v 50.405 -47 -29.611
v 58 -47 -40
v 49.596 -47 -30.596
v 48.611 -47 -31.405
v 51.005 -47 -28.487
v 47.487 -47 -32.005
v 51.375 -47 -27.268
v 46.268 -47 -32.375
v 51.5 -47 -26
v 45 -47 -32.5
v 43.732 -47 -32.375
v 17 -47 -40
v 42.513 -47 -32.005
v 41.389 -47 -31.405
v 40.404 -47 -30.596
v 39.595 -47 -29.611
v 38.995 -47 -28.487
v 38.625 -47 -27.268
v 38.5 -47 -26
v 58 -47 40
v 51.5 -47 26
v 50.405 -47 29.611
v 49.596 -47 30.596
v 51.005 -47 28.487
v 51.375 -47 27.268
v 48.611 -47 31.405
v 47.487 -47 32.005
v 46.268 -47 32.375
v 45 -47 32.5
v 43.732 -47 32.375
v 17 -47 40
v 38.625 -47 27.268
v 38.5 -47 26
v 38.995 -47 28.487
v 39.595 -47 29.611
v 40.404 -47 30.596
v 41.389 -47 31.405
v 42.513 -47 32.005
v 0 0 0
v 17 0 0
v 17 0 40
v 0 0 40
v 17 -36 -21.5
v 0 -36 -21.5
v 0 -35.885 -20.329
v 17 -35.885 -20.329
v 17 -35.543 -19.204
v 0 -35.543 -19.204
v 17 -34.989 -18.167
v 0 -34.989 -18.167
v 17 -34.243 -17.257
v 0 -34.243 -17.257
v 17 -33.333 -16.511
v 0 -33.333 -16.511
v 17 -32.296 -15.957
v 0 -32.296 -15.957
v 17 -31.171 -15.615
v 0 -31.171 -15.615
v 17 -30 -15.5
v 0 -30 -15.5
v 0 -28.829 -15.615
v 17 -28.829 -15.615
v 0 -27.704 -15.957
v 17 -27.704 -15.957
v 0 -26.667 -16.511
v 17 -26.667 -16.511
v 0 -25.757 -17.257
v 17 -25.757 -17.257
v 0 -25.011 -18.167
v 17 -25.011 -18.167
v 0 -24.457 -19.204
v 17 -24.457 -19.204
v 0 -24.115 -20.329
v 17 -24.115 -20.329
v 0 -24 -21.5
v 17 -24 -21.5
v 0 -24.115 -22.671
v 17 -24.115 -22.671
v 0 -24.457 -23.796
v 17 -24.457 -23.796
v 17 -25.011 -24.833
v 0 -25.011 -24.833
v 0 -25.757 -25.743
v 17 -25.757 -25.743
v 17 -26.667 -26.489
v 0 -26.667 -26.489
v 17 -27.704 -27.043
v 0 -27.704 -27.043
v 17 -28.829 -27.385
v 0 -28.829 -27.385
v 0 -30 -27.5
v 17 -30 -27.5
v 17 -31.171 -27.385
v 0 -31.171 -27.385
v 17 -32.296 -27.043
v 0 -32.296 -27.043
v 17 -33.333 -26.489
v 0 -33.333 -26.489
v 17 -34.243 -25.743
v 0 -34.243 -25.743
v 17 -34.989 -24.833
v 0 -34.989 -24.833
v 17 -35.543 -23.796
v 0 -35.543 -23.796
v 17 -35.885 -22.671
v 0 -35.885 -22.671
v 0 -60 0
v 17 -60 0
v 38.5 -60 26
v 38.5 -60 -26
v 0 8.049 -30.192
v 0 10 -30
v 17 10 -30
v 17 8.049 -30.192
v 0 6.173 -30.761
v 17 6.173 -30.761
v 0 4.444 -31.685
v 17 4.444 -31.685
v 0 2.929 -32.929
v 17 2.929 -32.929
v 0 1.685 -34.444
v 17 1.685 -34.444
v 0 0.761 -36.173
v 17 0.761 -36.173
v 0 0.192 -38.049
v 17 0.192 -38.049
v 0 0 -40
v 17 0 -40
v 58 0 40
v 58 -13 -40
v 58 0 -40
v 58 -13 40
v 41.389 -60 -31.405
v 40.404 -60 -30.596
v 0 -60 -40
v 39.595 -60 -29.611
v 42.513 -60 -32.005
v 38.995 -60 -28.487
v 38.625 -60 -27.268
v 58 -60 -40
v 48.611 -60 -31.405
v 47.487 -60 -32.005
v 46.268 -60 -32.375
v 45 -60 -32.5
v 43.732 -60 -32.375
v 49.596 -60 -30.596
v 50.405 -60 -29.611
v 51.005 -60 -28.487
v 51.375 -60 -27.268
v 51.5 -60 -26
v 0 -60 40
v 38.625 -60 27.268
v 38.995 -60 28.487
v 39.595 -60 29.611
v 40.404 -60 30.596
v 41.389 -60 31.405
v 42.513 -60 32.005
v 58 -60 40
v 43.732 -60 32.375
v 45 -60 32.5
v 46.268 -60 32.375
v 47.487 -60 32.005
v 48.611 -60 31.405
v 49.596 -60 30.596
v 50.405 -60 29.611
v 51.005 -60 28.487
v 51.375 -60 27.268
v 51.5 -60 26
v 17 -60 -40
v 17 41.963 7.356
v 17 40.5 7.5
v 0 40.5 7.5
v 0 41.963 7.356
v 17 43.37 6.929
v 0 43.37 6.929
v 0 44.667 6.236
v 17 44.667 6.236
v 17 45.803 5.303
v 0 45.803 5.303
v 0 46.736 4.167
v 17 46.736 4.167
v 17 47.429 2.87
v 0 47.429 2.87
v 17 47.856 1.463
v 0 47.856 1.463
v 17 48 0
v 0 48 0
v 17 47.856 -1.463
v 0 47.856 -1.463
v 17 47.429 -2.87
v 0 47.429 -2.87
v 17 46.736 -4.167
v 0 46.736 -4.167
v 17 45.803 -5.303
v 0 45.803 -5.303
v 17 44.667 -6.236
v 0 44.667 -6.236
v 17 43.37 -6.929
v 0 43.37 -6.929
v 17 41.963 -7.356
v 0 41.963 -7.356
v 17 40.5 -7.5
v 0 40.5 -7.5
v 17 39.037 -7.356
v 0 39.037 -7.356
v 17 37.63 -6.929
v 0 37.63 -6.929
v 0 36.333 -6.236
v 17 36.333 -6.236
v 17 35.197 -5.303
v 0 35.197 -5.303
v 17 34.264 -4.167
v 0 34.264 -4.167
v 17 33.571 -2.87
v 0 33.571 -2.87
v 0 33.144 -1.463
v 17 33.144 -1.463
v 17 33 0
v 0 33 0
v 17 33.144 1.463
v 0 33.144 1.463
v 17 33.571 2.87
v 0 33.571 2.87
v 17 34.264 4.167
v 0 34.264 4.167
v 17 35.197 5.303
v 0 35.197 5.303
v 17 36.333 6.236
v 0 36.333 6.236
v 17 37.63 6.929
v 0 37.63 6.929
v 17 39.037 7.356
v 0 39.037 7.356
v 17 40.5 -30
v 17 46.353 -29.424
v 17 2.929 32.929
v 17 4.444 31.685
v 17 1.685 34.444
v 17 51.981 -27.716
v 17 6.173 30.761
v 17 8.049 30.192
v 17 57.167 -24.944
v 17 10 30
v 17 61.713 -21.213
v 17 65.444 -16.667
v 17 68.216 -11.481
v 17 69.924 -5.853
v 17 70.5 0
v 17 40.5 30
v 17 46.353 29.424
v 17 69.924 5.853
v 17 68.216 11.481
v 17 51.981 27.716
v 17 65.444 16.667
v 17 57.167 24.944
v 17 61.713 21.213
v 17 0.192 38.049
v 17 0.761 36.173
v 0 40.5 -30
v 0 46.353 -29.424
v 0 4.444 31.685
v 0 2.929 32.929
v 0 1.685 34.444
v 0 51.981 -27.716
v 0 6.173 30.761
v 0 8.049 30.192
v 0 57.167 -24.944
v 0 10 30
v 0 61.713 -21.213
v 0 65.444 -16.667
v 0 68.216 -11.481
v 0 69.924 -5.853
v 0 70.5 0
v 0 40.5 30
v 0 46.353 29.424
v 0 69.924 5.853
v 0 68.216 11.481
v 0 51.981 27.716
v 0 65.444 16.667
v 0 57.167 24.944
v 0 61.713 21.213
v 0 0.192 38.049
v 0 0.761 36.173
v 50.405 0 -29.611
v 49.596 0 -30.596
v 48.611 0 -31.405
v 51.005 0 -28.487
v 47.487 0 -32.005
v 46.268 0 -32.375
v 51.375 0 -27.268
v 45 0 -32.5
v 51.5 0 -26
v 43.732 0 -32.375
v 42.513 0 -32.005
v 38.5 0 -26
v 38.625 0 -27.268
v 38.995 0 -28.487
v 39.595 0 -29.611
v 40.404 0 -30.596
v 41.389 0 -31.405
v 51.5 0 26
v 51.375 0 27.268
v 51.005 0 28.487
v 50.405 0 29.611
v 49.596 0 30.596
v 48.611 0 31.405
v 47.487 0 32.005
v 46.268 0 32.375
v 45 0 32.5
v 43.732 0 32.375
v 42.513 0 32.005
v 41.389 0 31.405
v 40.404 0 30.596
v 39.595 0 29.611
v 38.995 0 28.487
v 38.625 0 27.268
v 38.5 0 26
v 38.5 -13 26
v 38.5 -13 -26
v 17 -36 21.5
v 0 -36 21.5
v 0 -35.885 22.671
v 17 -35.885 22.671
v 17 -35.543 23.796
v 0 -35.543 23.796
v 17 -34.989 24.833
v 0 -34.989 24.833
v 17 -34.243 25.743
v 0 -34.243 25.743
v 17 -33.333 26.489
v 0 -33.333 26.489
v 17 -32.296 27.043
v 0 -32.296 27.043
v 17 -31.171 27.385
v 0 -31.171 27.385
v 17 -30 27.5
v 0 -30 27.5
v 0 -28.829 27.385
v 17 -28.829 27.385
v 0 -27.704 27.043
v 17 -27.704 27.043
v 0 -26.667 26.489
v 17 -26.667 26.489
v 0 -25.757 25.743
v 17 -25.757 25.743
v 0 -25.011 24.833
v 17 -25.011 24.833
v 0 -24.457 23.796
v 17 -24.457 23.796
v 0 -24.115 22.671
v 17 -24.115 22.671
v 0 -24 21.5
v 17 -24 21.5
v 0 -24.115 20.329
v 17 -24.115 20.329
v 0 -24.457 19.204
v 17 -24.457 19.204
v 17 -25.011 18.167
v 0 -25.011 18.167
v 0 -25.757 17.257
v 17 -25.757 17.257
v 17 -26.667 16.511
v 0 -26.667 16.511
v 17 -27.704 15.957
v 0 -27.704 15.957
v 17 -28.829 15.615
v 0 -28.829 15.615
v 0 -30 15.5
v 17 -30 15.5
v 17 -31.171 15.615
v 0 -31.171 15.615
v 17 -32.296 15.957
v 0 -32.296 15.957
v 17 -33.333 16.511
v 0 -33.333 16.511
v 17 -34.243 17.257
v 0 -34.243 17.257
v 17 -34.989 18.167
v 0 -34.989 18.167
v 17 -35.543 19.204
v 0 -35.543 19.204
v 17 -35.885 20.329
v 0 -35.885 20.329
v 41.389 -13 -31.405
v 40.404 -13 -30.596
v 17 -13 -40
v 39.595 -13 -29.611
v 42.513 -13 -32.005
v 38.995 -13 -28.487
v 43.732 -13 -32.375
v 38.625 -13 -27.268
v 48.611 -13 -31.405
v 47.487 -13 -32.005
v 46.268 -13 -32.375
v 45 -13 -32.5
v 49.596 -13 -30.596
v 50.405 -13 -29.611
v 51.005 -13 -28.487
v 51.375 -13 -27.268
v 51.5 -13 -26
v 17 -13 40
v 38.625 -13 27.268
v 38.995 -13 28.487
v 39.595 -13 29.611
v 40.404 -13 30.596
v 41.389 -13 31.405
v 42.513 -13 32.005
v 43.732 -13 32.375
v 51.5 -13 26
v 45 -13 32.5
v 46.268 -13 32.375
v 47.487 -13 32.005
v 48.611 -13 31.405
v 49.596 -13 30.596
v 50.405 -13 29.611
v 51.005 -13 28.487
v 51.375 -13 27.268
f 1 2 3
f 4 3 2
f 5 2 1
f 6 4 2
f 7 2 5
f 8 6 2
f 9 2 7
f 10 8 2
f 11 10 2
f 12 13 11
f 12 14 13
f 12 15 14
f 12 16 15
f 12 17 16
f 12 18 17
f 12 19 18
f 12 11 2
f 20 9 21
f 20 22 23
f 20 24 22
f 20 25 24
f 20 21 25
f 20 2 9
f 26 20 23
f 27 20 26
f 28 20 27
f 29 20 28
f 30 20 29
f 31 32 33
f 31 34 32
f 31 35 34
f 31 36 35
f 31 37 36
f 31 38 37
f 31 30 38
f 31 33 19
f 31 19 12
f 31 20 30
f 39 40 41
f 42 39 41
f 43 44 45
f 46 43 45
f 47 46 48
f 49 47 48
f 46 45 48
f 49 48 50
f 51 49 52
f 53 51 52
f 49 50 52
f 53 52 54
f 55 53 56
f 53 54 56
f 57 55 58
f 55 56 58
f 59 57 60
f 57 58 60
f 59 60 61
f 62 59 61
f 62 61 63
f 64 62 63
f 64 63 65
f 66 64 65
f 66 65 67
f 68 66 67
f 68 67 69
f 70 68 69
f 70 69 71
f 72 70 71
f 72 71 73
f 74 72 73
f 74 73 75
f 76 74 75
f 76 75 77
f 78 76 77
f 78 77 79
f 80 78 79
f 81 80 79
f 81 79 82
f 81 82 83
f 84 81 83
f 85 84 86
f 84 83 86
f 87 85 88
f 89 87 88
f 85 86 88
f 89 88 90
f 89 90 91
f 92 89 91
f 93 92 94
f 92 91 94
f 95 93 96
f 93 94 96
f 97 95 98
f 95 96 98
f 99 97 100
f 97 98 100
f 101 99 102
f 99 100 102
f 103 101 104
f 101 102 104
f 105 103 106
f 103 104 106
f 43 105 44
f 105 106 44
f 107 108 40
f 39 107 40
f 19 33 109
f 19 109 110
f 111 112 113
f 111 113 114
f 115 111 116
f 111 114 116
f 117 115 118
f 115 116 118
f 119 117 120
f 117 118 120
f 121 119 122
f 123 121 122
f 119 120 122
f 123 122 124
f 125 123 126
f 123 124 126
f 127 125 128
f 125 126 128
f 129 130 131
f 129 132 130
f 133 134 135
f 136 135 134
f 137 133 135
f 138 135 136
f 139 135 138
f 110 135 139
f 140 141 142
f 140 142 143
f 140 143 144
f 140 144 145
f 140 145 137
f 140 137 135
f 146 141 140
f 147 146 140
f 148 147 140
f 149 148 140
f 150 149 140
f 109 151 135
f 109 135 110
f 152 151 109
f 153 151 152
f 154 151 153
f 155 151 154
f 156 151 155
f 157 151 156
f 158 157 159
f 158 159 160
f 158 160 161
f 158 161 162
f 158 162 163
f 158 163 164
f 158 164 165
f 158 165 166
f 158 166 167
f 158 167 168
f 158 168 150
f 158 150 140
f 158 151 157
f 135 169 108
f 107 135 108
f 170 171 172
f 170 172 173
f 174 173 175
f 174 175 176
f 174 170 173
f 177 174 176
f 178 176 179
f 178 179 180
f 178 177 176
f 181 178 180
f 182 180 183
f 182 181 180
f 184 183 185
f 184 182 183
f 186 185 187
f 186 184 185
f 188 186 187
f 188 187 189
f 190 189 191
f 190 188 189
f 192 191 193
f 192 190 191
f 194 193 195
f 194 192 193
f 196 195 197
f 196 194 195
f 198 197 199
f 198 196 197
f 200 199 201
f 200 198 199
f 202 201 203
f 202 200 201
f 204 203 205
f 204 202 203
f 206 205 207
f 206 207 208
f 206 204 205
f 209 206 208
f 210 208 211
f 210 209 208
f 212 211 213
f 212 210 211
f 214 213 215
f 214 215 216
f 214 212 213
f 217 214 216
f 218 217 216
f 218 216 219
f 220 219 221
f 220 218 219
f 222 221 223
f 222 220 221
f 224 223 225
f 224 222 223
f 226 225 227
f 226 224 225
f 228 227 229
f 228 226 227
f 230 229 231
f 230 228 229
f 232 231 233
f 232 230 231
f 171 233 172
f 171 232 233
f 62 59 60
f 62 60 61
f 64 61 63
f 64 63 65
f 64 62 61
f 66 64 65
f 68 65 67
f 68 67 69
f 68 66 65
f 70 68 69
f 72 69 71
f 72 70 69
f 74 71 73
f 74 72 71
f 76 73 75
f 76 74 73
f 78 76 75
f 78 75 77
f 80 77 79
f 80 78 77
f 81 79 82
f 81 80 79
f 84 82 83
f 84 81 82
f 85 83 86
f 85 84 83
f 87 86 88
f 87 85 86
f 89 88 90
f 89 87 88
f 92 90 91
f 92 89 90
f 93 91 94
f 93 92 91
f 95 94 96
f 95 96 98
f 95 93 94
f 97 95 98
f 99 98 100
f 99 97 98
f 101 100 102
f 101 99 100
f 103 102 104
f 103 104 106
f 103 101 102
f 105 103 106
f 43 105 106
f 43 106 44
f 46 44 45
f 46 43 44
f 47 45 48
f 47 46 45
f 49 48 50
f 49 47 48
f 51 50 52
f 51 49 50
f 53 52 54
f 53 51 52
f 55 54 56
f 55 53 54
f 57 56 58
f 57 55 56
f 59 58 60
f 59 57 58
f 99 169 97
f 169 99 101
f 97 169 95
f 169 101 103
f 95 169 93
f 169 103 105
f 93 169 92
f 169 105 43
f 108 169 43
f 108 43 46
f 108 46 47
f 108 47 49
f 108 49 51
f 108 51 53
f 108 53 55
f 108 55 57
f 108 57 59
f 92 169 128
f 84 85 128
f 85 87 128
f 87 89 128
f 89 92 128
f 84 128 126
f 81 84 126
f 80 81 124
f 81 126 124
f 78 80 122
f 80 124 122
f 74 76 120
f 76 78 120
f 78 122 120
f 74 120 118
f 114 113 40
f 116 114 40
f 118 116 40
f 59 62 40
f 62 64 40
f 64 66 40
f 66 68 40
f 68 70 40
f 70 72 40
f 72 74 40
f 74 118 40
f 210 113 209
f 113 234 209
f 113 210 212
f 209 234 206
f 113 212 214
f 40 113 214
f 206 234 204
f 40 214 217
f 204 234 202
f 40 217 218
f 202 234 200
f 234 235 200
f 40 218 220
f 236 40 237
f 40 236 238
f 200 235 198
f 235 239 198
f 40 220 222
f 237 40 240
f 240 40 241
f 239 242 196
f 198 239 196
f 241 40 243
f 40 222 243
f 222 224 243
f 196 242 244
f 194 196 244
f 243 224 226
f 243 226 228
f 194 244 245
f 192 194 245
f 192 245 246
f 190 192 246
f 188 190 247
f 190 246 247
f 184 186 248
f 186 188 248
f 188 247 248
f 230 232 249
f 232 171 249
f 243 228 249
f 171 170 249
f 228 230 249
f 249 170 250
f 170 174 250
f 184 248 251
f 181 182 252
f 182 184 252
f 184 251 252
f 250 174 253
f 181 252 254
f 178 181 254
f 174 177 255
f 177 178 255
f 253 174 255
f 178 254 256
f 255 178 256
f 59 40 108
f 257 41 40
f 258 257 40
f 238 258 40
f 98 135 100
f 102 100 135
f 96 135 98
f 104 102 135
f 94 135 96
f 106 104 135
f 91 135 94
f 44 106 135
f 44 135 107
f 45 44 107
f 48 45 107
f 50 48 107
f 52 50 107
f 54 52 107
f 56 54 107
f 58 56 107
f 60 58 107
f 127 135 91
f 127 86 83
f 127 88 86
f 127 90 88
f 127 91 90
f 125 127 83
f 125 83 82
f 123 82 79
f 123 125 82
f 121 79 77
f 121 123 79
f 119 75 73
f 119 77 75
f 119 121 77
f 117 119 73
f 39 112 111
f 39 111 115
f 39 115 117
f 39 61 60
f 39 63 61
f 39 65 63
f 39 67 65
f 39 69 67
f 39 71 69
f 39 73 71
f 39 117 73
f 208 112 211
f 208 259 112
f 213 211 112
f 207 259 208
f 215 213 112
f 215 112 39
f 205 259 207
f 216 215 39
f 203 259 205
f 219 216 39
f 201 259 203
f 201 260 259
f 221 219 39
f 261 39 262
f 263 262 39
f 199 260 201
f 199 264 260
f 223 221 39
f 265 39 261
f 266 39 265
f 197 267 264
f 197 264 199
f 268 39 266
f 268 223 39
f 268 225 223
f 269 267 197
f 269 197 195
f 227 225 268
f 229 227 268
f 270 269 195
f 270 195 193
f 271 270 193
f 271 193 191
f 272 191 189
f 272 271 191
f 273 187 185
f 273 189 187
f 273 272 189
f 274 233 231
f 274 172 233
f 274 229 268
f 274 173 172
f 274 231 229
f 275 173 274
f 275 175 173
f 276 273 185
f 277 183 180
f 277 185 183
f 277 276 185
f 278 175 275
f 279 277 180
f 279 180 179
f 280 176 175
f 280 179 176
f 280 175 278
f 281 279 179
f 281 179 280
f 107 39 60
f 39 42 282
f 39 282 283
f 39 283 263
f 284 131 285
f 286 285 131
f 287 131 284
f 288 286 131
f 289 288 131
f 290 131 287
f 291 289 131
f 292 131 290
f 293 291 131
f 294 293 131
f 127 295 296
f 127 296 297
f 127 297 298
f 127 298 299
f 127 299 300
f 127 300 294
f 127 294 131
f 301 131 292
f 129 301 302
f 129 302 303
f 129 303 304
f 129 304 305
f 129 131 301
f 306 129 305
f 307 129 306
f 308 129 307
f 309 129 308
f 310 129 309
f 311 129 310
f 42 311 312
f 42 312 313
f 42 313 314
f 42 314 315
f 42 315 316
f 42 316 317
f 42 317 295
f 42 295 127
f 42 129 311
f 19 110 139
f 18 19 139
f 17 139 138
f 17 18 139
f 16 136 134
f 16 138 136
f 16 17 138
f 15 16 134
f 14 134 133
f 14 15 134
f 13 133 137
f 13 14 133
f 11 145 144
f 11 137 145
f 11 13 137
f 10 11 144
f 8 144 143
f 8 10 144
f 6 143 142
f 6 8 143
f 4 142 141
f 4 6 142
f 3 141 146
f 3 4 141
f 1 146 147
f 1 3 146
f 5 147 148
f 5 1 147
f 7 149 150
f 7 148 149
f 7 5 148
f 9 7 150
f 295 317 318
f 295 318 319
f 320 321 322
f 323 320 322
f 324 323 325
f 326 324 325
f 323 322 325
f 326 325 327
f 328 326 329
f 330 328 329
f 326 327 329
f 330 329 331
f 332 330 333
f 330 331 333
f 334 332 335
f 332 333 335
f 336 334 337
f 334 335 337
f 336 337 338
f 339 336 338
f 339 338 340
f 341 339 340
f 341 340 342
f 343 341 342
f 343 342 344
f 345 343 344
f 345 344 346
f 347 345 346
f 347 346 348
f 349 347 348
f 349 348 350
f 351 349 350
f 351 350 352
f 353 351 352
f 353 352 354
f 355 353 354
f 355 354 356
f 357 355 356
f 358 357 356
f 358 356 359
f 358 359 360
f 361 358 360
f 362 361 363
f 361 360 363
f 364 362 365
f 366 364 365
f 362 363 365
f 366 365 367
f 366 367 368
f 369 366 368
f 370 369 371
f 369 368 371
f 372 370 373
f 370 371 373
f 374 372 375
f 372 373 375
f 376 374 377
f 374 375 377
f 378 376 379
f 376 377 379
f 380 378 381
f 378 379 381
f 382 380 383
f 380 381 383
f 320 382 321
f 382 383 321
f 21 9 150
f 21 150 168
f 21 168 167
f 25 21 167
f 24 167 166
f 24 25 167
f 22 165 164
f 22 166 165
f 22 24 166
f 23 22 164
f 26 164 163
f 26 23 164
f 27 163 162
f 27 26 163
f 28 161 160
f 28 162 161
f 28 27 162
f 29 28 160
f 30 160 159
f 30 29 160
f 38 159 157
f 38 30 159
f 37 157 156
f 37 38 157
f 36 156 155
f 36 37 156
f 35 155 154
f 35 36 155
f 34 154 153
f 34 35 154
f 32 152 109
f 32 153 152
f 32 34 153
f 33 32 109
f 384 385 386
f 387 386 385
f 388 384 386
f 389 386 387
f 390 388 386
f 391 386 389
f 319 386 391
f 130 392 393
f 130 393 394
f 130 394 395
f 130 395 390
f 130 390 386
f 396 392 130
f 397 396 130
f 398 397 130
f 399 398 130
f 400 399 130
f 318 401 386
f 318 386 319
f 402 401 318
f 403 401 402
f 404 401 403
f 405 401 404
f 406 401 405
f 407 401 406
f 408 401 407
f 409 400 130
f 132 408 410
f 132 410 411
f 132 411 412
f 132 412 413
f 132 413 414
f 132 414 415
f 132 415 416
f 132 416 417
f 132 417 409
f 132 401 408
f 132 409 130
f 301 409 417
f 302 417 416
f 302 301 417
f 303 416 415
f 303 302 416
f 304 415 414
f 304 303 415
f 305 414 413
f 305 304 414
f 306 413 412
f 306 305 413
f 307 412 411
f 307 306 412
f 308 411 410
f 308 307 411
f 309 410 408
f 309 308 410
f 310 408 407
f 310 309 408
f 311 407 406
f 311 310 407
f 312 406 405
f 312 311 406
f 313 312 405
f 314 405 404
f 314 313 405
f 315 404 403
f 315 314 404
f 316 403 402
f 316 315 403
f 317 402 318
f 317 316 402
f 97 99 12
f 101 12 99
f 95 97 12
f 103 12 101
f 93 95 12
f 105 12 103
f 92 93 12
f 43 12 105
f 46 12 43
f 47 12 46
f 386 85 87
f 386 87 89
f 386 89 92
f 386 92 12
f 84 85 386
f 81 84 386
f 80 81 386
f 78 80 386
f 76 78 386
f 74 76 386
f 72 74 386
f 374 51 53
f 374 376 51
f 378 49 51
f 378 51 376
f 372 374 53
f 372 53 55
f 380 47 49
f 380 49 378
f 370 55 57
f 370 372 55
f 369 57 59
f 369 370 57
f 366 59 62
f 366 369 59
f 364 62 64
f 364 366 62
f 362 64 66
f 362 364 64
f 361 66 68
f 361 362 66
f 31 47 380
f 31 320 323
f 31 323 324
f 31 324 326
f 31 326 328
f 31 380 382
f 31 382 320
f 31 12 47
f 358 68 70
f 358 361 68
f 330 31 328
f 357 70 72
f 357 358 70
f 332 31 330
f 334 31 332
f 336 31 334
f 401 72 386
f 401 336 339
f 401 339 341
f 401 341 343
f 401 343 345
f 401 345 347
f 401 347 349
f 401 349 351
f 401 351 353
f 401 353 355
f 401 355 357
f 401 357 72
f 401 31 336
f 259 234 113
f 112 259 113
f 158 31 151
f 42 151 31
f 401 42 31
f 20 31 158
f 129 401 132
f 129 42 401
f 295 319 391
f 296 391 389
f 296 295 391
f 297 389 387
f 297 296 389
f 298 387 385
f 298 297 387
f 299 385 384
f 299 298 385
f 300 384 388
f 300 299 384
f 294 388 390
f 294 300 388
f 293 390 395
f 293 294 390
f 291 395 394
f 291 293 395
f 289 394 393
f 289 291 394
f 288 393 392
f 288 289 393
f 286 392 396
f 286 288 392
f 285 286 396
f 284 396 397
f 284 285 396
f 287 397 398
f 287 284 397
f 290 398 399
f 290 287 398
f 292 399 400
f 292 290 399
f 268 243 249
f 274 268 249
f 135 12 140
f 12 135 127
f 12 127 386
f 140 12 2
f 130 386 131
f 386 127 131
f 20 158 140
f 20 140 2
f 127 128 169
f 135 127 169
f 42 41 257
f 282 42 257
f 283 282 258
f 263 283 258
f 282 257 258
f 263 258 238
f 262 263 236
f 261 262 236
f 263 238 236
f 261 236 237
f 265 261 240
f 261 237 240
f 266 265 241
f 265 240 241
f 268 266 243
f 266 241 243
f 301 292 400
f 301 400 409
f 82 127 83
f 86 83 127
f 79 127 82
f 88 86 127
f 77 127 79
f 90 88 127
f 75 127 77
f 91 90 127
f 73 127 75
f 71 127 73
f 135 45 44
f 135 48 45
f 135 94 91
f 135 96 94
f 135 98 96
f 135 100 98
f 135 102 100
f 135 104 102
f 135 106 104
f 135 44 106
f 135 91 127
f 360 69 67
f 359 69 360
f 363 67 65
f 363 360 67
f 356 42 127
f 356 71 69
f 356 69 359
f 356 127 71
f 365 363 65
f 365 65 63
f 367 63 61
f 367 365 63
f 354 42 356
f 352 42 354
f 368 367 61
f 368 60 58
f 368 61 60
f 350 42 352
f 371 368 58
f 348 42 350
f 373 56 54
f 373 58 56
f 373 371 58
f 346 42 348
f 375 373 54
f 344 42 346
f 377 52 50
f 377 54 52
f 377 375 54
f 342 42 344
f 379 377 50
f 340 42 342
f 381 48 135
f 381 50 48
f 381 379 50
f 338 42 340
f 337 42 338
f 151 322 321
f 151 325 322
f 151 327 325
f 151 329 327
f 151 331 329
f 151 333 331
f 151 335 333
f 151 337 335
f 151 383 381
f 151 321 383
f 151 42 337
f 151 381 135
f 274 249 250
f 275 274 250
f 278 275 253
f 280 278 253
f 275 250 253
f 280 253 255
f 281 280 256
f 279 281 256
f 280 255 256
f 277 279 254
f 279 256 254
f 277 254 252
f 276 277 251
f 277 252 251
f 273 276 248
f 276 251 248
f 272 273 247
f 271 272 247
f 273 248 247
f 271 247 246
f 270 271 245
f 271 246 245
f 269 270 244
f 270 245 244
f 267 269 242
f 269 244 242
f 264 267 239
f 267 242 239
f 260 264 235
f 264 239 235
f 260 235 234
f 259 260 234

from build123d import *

# Parameters (mm, degrees)
BOSS_EXTRUDE1_DEPTH       = 40
SKETCH10_R                = 6
CUT_EXTRUDE1_DEPTH        = 80
BOSS_EXTRUDE2_START       = -17
BOSS_EXTRUDE2_OUTLINE_R   = 6
BOSS_EXTRUDE2_OUTLINE_R_2 = 7.5
BOSS_EXTRUDE2_DEPTH       = 17
CUT_EXTRUDE3_DEPTH        = 100.670707833


# Read off the part's stored shape, not the designer's step: Boss-Extrude2
with BuildPart() as part:
    # Sketch9 → Boss-Extrude1 (new, symmetric)
    with BuildSketch(Plane.XY):
        Polygon((0, 0), (0, -60), (58, -60), (58, -47), (17, -47), (17, -13), (58, -13), (58, 0), align=None)
    extrude(amount=BOSS_EXTRUDE1_DEPTH, both=True)

    # Sketch10 → Cut-Extrude1 (cut)
    with BuildSketch(Plane.ZY):
        with Locations(Location((-21.5, -30, 0), (0, 0, 270))):
            Circle(SKETCH10_R)
        with Locations(Location((21.5, -30, 0), (0, 0, 270))):
            Circle(SKETCH10_R)
    extrude(amount=-CUT_EXTRUDE1_DEPTH, mode=Mode.SUBTRACT)

    # Sketch11 → Cut-Extrude3 (cut, through all)
    with BuildSketch(Plane(origin=(0, 0, 0), x_dir=(1, 0, 0), z_dir=(0, 1, 0))):
        with BuildLine():
            Line((51.5, 26), (51.5, -26))
            ThreePointArc((51.5, -26), (45, -32.5), (38.5, -26))
            Line((38.5, -26), (38.5, 26))
            ThreePointArc((38.5, 26), (45, 32.5), (51.5, 26))
        make_face()
    extrude(amount=-CUT_EXTRUDE3_DEPTH, mode=Mode.SUBTRACT)


with BuildPart() as body_2:
    # Boss-Extrude2 outline → Boss-Extrude2 (new body)
    with BuildSketch(Plane.ZY.offset(BOSS_EXTRUDE2_START)):
        with BuildLine():
            Line((0, -60), (0, 0))
            Line((0, 0), (40, 0))
            ThreePointArc((40, 0), (32.928932188, 2.928932188), (30, 10))
            Line((30, 10), (30, 40.5))
            ThreePointArc((30, 40.5), (0, 70.5), (-30, 40.5))
            Line((-30, 40.5), (-30, 10))
            ThreePointArc((-30, 10), (-32.928932188, 2.928932188), (-40, 0))
            Line((-40, 0), (-40, -60))
            Line((-40, -60), (0, -60))
        make_face()
        with Locations((-21.5, -30)):
            Circle(BOSS_EXTRUDE2_OUTLINE_R, mode=Mode.SUBTRACT)
        with Locations((0, 40.5)):
            Circle(BOSS_EXTRUDE2_OUTLINE_R_2, mode=Mode.SUBTRACT)
    extrude(amount=BOSS_EXTRUDE2_DEPTH)


solid = Compound([part.part, body_2.part])
